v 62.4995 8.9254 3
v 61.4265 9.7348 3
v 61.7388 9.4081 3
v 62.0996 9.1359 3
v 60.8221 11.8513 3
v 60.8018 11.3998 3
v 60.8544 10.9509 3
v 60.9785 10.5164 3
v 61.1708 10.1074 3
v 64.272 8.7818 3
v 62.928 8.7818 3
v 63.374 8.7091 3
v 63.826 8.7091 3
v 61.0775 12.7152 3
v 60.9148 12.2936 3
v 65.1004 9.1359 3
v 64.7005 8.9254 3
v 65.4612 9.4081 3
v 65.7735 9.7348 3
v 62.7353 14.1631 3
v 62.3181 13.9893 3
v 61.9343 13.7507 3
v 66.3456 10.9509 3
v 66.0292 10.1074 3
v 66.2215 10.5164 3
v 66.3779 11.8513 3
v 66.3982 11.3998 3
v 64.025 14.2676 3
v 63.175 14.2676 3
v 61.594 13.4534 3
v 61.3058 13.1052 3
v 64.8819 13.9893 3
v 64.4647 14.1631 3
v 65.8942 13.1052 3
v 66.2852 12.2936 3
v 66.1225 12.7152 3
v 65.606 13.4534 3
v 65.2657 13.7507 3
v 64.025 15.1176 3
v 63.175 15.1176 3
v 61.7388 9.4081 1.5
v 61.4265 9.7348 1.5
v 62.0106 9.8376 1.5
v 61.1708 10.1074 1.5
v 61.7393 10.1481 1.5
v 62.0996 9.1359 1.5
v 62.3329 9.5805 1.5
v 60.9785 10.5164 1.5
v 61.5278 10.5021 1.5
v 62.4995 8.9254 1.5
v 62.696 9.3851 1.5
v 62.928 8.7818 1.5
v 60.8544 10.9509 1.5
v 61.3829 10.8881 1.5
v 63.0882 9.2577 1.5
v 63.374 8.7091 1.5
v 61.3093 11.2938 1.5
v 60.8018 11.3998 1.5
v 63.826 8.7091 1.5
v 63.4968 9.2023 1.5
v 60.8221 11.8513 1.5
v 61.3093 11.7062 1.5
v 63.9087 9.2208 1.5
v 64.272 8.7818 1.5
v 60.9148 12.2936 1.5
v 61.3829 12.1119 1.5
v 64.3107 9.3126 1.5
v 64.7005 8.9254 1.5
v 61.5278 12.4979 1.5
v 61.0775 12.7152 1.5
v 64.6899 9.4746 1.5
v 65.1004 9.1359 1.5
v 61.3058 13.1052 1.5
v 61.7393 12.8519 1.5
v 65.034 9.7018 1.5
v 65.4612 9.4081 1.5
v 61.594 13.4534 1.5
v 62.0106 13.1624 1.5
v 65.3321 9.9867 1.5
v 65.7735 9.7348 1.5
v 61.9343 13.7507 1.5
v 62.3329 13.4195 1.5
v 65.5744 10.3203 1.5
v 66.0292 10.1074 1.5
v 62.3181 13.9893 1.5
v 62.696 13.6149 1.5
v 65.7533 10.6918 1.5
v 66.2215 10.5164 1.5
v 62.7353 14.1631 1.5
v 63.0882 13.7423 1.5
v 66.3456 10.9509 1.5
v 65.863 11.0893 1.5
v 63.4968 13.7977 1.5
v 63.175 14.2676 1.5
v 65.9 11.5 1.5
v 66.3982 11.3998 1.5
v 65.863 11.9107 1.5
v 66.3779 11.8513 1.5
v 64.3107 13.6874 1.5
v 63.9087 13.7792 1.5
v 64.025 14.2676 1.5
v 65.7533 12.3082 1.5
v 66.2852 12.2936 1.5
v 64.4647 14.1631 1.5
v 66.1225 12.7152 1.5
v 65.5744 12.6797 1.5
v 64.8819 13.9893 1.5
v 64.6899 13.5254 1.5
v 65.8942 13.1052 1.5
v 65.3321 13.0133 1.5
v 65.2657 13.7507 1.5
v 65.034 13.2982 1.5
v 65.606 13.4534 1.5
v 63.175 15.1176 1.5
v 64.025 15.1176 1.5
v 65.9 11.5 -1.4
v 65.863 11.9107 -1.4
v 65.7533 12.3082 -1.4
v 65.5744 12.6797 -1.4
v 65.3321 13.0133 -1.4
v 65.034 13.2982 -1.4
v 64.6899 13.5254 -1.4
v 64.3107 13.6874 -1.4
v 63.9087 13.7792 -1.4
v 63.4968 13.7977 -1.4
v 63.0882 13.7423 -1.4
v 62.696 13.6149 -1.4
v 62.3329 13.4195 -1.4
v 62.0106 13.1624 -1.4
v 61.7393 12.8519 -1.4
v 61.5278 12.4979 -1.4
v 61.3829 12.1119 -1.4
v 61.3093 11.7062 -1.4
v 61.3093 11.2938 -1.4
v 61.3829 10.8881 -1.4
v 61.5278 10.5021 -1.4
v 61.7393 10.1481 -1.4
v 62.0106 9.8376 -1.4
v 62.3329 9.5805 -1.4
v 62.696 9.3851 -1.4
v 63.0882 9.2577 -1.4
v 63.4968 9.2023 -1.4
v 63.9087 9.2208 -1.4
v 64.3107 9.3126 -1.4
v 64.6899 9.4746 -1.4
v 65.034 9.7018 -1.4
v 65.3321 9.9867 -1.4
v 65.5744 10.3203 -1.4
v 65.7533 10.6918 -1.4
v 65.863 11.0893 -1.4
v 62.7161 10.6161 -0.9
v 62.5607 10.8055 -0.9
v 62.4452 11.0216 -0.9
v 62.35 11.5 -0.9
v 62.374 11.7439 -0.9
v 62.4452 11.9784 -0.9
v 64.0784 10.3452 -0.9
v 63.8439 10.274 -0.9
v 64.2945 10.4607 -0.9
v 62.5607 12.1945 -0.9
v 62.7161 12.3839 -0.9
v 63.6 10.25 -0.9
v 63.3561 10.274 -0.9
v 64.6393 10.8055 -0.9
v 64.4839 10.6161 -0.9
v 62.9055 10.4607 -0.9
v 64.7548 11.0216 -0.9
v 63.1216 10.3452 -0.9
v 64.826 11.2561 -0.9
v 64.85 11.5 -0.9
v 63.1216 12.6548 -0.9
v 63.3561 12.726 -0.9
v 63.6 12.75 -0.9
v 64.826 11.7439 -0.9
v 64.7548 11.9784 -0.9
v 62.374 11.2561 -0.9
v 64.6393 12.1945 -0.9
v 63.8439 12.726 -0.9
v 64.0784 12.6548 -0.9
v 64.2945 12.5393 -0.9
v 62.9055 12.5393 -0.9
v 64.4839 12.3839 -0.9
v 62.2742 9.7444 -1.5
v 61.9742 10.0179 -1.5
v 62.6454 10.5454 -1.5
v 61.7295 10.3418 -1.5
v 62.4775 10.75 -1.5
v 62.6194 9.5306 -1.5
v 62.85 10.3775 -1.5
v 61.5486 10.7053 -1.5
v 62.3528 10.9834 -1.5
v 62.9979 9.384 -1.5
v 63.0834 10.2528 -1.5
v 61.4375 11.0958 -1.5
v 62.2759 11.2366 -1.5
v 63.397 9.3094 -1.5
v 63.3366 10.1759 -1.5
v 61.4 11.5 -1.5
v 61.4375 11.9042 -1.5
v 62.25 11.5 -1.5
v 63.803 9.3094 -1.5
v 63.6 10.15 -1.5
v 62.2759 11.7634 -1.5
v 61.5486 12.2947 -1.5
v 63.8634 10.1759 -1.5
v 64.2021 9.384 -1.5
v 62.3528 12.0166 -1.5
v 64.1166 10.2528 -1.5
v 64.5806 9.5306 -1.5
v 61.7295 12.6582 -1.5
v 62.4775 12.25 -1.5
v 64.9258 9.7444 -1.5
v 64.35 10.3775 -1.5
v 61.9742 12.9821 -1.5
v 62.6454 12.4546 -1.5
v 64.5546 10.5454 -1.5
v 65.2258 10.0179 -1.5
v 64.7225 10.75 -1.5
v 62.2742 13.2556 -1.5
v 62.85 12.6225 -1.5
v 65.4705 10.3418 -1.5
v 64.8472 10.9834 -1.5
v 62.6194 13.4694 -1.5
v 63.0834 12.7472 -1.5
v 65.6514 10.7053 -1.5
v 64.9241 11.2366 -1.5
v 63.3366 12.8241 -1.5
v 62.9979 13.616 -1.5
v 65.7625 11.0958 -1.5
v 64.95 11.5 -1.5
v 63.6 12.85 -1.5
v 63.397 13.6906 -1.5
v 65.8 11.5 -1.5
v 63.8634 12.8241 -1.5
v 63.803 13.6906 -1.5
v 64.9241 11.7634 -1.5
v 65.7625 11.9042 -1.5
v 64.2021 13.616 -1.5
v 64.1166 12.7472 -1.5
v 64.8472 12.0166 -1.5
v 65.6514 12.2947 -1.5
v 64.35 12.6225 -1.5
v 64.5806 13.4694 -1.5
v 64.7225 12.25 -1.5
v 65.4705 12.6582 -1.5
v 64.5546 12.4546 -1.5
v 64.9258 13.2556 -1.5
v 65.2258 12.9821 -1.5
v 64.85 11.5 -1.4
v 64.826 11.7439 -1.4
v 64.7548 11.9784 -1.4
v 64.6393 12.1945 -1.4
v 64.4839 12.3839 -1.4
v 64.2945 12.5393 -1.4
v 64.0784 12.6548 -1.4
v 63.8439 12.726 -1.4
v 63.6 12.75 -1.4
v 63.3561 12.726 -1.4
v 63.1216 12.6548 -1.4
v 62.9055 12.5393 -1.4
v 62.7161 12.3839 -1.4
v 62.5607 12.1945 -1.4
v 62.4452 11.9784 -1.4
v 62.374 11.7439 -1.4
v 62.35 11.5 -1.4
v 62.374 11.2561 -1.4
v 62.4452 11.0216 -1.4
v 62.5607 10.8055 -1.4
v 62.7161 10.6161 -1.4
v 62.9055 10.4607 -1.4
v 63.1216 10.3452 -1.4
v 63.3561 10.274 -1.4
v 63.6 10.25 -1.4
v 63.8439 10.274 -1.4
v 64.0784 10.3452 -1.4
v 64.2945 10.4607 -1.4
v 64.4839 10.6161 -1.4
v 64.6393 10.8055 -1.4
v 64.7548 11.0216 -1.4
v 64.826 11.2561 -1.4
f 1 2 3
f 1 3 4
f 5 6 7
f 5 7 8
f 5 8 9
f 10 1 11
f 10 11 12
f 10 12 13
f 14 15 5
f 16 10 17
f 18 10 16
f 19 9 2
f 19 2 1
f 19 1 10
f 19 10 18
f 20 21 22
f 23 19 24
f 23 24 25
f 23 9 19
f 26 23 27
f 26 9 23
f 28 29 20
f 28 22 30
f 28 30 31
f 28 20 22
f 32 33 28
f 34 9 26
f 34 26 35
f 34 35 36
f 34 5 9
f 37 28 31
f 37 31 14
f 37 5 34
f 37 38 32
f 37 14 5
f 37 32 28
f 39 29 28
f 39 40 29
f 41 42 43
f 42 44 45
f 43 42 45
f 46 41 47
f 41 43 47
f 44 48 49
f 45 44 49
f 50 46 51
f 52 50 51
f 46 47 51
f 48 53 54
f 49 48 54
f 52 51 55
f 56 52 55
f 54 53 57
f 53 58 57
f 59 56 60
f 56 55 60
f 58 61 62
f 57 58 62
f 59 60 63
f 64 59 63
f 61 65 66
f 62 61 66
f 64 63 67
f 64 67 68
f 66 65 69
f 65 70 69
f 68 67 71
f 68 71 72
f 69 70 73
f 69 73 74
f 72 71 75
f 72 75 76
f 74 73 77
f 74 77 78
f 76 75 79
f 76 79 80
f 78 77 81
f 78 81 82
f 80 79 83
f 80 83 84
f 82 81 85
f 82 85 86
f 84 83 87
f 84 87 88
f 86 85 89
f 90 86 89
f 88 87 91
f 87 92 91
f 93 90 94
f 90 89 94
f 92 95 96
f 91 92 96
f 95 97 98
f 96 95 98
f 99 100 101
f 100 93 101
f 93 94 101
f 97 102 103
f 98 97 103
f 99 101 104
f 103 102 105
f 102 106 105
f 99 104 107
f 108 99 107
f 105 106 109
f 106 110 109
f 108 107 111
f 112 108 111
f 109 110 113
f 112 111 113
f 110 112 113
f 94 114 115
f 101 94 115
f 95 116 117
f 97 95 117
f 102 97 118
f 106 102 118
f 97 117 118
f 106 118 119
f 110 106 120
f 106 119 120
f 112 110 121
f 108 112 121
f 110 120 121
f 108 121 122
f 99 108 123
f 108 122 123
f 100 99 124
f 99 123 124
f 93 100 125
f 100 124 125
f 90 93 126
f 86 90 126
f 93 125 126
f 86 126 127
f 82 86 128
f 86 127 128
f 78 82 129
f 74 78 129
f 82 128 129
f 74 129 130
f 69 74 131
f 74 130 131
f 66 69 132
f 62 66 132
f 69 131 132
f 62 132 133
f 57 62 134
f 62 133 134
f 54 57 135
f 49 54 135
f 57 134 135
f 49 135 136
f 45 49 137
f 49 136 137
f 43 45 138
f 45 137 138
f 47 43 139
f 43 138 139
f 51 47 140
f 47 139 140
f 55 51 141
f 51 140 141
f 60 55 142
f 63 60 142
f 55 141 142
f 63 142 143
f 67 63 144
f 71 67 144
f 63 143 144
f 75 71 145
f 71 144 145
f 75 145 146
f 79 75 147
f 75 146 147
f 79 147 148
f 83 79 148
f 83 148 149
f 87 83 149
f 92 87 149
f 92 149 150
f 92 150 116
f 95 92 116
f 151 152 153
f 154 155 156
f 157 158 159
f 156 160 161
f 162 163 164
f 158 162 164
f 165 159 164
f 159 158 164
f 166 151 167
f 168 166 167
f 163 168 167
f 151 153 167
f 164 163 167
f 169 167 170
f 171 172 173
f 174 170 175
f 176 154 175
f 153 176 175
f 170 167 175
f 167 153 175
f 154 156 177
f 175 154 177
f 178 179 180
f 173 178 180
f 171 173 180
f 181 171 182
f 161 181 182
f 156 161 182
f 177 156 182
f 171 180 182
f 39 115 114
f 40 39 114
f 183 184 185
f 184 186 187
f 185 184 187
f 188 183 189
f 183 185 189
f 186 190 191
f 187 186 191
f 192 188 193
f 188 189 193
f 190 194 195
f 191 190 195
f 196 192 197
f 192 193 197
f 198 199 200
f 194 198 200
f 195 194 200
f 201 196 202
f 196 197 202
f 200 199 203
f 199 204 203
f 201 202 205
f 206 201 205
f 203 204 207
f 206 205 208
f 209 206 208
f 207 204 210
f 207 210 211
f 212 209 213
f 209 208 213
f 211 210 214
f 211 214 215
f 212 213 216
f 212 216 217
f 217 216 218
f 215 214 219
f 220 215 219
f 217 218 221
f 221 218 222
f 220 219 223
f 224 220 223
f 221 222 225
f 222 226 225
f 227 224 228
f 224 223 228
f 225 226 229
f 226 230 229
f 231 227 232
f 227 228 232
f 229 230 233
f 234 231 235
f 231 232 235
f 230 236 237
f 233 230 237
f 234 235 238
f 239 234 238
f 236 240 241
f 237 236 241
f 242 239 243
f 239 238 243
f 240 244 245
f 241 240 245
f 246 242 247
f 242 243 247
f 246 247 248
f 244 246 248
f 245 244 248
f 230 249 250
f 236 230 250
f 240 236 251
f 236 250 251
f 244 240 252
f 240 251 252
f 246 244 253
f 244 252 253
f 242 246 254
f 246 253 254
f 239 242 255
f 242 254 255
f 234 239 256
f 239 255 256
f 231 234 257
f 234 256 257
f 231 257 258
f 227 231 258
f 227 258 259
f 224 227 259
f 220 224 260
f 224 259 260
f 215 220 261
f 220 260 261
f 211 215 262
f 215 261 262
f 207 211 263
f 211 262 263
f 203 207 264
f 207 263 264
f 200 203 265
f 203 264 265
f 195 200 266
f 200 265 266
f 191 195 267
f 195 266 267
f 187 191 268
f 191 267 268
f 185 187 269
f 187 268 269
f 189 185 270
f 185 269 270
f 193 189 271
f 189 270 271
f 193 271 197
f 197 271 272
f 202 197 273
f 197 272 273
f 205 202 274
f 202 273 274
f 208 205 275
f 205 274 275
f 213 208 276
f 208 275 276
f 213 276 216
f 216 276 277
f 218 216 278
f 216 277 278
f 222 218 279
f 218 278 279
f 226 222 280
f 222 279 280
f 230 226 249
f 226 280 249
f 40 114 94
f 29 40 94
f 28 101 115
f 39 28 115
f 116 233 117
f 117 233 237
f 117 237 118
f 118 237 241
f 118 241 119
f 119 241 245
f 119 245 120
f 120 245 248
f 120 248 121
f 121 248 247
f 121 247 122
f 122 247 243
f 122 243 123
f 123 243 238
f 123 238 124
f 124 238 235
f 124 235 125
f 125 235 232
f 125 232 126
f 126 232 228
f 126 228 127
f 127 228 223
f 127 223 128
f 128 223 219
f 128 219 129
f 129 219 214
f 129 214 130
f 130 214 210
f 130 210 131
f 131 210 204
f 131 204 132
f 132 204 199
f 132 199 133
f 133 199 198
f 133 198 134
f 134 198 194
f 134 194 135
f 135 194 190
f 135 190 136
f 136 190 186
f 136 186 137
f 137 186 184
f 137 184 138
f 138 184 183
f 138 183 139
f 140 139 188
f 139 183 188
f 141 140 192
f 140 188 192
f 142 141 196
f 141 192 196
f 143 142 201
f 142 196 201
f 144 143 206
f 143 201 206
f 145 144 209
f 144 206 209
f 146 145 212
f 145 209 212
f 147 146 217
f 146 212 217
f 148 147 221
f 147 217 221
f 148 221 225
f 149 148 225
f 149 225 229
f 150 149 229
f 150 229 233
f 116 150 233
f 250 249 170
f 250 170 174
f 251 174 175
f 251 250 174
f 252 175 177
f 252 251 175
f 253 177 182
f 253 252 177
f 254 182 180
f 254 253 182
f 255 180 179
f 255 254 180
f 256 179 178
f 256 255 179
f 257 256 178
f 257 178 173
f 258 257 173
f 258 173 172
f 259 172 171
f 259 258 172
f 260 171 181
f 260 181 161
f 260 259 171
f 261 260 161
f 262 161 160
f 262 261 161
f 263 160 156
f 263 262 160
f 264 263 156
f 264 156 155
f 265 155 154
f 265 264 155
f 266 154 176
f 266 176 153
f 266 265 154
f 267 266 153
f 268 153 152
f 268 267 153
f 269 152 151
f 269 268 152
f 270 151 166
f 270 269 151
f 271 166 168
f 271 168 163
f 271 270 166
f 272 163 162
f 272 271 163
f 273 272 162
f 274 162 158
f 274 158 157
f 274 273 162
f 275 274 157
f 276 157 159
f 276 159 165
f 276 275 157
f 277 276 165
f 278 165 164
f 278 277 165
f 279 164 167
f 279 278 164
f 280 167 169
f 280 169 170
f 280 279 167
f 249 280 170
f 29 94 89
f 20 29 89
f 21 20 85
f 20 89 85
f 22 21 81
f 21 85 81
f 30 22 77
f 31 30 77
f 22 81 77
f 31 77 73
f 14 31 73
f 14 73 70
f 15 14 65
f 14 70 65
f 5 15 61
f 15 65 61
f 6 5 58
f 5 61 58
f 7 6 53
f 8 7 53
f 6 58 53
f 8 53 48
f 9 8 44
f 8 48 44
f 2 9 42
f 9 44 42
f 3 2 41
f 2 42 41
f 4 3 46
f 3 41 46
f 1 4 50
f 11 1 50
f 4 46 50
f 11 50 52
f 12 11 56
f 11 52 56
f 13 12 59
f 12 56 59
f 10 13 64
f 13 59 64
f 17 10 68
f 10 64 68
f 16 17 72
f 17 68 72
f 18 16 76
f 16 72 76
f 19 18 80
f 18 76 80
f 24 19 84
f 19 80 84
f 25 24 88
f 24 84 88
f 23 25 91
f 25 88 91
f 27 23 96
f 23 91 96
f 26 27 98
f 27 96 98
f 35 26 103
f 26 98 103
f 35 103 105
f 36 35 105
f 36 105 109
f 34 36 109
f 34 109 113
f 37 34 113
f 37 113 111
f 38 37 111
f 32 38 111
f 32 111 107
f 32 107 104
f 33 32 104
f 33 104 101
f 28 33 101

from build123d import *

# Parameters (mm, degrees)
SKETCH058_R     = 2.3
PAD040_DEPTH    = 3
PAD041_DEPTH    = 1.5
SKETCH060_R     = 1.25
POCKET011_DEPTH = 0.6
CHAMFER005_SIZE = 0.1


with BuildPart() as part:
    # Sketch058 → Pad040 (new body)
    with BuildSketch(Plane.XY):
        Circle(SKETCH058_R)
    extrude(amount=PAD040_DEPTH)

    # Sketch059 (on Face3 of Pad040) → Pad041 (join)
    with BuildSketch(Plane.XY.offset(3)):
        with BuildLine():
            Line((0.425, 2.767558), (0.425, 3.617558))
            Line((0.425, 3.617558), (-0.425, 3.617558))
            Line((-0.425, 3.617558), (-0.425, 2.767558))
            ThreePointArc((-0.425, 2.767558), (0, -2.8), (0.425, 2.767558))
        make_face()
    extrude(amount=PAD041_DEPTH)

    # Sketch060 → Pocket011 (cut)
    with BuildSketch(Plane.XY):
        Circle(SKETCH060_R)
    extrude(amount=POCKET011_DEPTH, mode=Mode.SUBTRACT)

    # Chamfer005
    chamfer005_edges = [part.edges().sort_by_distance(p)[0] for p in [
        (-1.25, 0, 0),
        (-2.3, 0, 0),
    ]]
    chamfer(chamfer005_edges, length=CHAMFER005_SIZE)


with BuildPart() as part_1:
    # Body017 placement: moved
    add(part.part.moved(Location((63.6, 11.5, -1.5))))


solid = part_1.part
